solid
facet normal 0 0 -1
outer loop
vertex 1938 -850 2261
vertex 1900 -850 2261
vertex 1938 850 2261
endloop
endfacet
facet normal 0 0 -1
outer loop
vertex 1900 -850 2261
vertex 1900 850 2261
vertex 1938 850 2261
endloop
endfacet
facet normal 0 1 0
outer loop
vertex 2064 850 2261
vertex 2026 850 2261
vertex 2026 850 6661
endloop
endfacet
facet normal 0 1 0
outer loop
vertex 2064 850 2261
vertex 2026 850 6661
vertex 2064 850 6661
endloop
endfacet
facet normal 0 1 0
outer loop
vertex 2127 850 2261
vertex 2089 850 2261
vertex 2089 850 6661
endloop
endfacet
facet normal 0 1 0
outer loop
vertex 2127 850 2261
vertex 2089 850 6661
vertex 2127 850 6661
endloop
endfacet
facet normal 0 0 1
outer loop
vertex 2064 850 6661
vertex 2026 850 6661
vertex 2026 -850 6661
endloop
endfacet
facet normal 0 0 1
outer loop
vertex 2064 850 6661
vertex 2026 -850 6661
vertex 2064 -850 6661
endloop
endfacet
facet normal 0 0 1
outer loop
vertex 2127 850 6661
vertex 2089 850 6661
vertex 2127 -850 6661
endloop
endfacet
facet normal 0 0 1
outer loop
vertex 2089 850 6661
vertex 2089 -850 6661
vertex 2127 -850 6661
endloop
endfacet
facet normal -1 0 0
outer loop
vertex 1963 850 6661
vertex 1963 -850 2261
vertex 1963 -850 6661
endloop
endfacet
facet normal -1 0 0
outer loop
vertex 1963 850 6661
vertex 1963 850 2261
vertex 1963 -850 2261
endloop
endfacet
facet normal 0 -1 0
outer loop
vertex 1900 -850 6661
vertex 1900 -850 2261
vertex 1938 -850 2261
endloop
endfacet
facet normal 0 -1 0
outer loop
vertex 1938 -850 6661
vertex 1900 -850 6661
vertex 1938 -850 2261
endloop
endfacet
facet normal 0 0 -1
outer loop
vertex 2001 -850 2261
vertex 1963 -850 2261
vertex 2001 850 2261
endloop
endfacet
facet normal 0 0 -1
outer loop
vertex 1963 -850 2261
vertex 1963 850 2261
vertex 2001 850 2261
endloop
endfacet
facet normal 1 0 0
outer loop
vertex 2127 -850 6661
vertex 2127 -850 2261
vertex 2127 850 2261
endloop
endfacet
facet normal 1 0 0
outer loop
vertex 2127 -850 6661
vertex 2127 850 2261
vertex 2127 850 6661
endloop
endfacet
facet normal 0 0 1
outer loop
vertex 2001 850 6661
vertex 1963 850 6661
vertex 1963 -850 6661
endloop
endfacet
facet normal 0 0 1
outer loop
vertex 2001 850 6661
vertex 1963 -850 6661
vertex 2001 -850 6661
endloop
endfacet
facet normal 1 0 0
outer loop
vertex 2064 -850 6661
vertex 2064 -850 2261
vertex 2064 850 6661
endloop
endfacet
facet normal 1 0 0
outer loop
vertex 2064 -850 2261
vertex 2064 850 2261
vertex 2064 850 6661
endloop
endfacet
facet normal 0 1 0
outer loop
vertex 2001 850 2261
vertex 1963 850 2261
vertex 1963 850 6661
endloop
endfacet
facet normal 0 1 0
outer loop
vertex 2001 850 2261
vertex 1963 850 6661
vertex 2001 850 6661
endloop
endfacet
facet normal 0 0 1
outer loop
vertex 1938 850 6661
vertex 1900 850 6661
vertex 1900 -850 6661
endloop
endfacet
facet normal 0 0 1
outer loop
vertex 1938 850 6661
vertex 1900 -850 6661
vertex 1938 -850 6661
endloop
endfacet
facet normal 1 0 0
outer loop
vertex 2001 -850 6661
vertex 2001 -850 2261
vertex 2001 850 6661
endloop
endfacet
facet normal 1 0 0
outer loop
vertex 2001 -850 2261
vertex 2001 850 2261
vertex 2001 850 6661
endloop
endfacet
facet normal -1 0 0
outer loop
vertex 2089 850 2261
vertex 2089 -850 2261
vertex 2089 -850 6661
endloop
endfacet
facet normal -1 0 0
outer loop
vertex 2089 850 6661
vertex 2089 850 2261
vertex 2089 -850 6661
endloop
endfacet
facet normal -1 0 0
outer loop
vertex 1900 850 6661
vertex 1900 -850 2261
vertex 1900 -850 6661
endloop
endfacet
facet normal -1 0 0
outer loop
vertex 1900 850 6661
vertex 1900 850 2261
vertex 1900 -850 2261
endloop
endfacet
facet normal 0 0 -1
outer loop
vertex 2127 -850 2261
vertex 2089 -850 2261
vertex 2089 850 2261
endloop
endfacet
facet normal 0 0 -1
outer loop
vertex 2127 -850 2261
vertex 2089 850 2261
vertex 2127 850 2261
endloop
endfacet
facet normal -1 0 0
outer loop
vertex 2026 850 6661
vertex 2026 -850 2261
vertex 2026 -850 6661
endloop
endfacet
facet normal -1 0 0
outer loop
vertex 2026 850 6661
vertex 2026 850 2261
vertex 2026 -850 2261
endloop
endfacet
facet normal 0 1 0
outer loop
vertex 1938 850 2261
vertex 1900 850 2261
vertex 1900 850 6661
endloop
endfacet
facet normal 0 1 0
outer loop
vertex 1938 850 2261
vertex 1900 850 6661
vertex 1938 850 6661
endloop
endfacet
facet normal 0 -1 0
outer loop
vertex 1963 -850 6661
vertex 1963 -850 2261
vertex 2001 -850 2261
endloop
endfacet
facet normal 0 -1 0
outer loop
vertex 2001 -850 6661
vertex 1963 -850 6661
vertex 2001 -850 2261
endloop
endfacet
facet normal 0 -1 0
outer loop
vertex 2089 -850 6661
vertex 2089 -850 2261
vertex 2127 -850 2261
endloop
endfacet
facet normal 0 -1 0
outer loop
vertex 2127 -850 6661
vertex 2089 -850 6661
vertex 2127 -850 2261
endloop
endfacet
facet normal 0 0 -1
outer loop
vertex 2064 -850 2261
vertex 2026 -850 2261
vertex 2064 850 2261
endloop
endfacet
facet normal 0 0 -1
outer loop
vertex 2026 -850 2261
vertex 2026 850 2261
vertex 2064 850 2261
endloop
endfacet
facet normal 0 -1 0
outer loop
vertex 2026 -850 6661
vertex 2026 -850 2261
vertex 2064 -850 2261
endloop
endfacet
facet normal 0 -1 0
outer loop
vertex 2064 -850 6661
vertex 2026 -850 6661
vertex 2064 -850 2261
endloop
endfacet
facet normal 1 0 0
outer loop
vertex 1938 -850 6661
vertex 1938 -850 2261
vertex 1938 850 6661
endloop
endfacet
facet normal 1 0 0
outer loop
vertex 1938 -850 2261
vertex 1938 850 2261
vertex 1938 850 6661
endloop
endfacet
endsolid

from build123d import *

# Parameters (mm, degrees)
F0_W     = 38
F0_H     = 4400
F1_DEPTH = 850


with BuildPart() as f1:
    # F0 (on Front) → F1 (new body, symmetric)
    with BuildSketch(Plane.XZ):
        with Locations((1919, 4461)):
            Rectangle(F0_W, F0_H)
        with Locations((1982, 4461)):
            Rectangle(F0_W, F0_H)
        with Locations((2045, 4461)):
            Rectangle(F0_W, F0_H)
        with Locations((2108, 4461)):
            Rectangle(F0_W, F0_H)
    extrude(amount=F1_DEPTH, both=True)


solid = f1.part
